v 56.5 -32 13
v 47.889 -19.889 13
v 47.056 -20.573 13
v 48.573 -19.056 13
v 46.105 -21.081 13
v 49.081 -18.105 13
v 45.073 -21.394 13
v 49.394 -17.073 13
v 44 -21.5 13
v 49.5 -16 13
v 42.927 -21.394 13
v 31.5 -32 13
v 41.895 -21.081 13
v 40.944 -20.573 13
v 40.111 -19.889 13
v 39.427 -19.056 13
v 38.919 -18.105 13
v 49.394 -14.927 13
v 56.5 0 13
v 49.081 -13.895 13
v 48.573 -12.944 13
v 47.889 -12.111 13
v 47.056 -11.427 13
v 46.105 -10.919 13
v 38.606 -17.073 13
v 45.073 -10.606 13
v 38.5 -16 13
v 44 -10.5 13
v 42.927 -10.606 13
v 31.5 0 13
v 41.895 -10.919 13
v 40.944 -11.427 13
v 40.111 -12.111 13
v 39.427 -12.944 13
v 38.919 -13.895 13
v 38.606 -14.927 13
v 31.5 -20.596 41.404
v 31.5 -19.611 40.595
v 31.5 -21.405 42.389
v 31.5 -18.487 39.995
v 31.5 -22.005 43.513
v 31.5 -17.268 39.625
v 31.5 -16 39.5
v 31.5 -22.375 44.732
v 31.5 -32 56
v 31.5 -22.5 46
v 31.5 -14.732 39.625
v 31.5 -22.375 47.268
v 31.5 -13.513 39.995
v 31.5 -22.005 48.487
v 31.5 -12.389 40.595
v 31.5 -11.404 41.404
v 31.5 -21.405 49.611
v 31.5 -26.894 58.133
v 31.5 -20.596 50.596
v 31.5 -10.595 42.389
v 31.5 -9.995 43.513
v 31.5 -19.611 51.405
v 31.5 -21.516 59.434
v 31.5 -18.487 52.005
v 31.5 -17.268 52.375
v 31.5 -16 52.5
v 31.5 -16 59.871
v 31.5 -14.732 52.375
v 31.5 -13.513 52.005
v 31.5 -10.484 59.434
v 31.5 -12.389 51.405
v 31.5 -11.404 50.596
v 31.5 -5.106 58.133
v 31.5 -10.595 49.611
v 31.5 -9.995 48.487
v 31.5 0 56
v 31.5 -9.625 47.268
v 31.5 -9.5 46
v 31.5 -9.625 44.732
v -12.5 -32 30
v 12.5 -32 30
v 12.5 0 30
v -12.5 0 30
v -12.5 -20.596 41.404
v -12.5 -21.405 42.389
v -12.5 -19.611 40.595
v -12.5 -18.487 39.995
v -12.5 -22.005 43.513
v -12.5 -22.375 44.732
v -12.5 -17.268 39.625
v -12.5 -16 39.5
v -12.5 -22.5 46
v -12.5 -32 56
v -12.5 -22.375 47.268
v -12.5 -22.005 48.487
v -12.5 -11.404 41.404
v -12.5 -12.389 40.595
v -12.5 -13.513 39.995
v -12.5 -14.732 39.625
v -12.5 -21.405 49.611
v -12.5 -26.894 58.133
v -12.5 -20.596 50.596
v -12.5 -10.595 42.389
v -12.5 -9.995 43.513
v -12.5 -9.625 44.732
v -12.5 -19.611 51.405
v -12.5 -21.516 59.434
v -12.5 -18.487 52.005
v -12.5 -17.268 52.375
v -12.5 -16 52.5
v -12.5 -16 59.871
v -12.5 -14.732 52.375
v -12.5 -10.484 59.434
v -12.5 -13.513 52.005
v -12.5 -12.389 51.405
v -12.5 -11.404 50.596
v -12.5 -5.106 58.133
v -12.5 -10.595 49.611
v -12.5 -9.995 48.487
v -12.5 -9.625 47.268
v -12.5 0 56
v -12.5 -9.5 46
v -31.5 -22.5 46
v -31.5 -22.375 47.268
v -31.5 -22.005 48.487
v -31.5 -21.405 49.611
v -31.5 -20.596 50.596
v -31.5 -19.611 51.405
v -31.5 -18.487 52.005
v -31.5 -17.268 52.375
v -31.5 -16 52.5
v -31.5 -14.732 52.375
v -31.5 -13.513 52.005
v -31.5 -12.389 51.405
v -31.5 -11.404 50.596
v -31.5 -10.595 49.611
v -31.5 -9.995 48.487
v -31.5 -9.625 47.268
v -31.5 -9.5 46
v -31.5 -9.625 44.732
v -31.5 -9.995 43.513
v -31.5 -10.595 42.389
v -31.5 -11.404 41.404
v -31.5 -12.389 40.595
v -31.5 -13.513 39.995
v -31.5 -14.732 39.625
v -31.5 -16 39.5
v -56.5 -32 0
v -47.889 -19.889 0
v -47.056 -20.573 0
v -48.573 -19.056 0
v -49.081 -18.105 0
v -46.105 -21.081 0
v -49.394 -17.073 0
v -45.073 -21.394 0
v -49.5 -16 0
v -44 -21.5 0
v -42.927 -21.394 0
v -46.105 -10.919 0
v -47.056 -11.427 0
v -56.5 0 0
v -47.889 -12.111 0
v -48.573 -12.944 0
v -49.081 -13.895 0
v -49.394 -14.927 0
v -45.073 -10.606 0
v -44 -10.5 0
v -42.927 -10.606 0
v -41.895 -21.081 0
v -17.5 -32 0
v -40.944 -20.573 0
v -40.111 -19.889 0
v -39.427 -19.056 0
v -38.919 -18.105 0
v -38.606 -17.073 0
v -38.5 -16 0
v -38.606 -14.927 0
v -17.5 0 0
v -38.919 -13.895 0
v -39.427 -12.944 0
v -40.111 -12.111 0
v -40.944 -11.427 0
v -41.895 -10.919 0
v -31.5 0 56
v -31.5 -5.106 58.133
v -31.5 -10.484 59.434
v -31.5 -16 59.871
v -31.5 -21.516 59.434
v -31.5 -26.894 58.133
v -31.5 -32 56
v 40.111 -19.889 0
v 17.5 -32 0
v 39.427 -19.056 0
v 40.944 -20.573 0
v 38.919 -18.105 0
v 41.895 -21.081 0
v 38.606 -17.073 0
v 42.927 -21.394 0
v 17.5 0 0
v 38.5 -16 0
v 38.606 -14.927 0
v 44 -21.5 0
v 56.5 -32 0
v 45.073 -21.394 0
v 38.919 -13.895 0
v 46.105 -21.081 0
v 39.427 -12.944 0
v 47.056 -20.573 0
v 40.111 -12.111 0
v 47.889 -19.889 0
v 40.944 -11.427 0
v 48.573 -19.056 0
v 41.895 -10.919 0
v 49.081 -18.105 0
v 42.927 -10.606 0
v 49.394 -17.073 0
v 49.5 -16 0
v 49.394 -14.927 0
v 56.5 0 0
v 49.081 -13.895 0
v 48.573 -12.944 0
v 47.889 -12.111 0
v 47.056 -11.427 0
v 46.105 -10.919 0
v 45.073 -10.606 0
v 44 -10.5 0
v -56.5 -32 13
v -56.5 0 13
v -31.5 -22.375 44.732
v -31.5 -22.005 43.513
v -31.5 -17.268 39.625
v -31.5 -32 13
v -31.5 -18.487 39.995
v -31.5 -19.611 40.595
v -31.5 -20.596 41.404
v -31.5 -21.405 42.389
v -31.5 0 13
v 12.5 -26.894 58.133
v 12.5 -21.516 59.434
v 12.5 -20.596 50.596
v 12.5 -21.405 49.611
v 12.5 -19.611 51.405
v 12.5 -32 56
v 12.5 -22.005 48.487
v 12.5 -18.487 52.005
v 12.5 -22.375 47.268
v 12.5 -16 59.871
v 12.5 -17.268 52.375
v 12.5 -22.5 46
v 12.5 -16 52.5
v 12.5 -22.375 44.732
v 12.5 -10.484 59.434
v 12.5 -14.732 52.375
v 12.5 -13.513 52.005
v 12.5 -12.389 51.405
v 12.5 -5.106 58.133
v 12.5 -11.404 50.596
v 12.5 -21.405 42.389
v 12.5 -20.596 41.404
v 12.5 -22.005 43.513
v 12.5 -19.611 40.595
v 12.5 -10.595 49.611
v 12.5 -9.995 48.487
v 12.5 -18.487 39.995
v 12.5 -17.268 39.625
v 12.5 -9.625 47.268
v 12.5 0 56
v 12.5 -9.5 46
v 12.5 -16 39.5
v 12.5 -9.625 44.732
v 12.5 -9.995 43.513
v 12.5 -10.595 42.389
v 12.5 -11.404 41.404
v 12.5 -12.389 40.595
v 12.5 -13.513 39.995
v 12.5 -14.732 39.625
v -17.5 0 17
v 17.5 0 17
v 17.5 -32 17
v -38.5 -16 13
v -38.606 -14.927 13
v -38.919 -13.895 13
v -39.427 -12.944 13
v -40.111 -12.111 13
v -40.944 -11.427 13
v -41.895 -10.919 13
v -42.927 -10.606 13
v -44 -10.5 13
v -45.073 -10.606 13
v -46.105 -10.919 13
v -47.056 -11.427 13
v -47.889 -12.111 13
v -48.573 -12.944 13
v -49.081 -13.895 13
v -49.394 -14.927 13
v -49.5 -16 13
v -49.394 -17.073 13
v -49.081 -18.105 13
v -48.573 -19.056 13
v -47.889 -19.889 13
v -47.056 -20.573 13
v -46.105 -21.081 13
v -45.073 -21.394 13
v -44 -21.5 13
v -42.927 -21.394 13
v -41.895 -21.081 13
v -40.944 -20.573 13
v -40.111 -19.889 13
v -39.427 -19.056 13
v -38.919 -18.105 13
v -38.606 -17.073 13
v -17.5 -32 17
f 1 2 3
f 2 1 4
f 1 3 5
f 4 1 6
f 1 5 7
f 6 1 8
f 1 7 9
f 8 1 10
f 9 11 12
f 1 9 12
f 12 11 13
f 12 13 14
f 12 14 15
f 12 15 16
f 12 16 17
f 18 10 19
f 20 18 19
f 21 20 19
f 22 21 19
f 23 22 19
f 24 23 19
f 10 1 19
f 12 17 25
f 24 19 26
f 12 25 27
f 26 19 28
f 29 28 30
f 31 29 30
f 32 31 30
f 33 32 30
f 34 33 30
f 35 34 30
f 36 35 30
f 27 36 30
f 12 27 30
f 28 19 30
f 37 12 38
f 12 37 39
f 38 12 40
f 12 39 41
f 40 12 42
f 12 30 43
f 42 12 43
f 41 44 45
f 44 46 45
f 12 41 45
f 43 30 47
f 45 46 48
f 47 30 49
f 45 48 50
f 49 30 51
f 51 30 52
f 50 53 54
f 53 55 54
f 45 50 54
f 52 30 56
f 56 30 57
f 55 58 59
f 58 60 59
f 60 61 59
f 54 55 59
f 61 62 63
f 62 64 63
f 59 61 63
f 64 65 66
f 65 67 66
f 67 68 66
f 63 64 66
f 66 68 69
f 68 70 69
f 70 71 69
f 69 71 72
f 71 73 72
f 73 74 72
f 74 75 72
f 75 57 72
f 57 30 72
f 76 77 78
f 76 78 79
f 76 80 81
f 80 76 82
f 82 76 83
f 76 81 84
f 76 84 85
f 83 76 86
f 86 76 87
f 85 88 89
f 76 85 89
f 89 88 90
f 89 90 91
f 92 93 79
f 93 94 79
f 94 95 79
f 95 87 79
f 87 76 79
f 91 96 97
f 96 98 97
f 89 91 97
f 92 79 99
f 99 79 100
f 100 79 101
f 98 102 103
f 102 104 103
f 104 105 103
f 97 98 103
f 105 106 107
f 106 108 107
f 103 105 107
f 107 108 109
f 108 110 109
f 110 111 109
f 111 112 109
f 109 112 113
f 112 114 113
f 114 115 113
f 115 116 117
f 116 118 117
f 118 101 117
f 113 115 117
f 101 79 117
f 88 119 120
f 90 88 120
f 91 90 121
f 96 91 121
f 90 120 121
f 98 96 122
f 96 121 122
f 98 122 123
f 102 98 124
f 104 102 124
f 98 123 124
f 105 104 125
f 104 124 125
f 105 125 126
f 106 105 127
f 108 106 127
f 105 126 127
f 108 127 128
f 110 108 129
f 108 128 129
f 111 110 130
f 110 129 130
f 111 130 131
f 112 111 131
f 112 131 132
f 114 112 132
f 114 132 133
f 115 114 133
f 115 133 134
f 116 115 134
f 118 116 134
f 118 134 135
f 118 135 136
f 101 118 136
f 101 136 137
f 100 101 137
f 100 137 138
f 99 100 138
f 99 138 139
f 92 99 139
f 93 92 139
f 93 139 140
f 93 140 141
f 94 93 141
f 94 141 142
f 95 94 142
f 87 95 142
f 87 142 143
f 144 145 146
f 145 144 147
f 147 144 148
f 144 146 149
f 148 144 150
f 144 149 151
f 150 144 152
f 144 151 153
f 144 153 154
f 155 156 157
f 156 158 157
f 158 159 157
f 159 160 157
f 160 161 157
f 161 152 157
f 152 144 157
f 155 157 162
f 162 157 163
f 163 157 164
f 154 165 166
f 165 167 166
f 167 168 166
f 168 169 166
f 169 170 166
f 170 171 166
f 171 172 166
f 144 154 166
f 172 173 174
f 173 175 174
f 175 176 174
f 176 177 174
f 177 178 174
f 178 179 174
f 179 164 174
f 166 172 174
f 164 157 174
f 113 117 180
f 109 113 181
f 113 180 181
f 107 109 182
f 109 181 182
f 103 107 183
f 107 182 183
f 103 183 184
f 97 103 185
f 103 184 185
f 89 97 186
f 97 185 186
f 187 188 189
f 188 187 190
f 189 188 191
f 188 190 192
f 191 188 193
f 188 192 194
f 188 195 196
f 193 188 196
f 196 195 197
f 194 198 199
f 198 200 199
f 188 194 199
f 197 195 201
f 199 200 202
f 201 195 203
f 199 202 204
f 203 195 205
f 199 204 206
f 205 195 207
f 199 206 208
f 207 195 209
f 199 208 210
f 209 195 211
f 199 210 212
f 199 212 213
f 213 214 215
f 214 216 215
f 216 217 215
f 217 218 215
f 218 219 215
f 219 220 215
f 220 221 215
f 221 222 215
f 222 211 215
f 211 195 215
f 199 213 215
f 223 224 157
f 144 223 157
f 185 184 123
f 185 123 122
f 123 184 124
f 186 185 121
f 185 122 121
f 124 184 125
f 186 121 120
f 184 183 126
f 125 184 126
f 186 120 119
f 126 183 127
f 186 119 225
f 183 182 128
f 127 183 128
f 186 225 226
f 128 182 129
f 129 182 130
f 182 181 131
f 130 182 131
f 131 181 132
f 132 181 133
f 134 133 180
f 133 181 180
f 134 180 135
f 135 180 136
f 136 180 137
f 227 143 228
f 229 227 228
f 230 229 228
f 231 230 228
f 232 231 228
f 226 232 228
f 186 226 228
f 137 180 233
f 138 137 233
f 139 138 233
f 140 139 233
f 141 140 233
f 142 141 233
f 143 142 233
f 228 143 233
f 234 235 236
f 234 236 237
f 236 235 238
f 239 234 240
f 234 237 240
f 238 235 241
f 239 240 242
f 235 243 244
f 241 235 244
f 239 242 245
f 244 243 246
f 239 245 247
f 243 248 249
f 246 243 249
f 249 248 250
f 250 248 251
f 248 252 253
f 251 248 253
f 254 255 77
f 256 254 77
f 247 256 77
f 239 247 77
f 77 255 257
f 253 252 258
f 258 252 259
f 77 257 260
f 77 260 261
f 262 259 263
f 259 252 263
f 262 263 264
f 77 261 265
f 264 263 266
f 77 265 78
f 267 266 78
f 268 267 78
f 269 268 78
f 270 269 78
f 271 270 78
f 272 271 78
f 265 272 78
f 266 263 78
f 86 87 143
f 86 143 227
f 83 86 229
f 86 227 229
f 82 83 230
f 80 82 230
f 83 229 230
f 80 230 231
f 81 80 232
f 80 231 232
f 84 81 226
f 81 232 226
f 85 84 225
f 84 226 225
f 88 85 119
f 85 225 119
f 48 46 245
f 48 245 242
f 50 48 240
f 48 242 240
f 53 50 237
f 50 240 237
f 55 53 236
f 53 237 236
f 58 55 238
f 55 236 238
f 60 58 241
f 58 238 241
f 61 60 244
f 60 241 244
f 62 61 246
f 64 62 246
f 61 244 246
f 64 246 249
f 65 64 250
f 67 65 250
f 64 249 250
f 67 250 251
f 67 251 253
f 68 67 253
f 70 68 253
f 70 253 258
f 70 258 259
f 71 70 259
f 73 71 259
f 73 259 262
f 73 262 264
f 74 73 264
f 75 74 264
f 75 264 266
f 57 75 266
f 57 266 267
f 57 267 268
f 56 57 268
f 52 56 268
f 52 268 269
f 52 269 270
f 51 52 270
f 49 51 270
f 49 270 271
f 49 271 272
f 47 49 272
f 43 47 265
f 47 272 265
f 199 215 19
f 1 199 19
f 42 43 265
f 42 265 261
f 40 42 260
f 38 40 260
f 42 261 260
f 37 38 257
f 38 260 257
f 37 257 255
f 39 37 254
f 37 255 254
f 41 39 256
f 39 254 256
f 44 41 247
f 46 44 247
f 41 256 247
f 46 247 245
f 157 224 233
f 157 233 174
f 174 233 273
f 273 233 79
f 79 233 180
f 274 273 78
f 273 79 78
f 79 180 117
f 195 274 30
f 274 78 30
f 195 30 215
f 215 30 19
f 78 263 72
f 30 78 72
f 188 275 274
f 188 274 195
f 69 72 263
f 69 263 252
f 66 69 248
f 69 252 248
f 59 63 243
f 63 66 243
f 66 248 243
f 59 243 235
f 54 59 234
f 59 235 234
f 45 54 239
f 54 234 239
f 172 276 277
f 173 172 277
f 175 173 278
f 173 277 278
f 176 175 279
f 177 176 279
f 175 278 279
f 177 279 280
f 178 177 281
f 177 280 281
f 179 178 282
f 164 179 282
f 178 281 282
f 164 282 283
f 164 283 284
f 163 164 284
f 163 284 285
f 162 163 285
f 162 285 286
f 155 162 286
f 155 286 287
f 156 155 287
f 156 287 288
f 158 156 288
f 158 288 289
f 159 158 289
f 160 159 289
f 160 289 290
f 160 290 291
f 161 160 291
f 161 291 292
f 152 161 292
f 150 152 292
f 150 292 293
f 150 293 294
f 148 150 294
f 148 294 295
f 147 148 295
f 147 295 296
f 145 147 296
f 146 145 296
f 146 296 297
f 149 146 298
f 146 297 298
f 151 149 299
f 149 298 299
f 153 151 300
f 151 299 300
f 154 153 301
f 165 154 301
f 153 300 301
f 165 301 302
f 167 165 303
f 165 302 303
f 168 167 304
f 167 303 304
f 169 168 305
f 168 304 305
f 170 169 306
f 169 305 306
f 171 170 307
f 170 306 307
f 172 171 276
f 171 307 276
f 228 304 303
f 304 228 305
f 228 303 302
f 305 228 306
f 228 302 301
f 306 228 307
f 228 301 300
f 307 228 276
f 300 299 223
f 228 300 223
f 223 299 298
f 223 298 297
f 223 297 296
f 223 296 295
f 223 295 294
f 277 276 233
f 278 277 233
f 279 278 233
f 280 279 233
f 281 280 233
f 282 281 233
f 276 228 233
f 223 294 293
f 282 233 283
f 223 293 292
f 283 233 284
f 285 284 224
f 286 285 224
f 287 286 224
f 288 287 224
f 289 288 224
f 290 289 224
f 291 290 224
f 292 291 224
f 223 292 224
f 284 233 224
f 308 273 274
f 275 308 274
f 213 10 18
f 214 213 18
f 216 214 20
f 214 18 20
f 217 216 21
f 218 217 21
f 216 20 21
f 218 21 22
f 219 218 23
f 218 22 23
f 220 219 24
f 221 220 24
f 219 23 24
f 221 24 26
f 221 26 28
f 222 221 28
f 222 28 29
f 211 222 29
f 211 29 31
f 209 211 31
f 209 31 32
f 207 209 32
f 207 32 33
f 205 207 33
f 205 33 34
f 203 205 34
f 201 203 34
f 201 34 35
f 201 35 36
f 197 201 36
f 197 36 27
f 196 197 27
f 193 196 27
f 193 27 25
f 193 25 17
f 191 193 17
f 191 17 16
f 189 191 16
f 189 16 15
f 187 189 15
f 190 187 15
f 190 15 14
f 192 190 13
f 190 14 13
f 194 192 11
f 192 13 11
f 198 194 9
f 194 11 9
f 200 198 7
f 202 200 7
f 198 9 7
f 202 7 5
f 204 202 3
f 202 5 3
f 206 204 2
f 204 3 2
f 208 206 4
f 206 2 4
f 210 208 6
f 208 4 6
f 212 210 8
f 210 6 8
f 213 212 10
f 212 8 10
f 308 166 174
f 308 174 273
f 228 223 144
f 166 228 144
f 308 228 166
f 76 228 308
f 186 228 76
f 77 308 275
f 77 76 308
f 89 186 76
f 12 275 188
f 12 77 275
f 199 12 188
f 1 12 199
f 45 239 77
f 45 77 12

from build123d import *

# Parameters (mm, degrees)
F1_DEPTH = 32
F2_R     = 5.5
F4_DEPTH = 13.001
F3_R     = 5.5
F5_DEPTH = 13.001
F7_DEPTH = 88.001
F9_DEPTH = 88.001


with BuildPart() as f1:
    # F0 (on Front) → F1 (new body)
    with BuildSketch(Plane.XZ):
        Polygon((17.5, 0), (56.5, 0), (56.5, 13), (31.5, 13), (31.5, 64), (12.5, 64), (12.5, 30), (-12.5, 30), (-12.5, 64), (-31.5, 64), (-31.5, 13), (-56.5, 13), (-56.5, 0), (-17.5, 0), (-17.5, 17), (17.5, 17), align=None)
    extrude(amount=F1_DEPTH)

    # F2 (on face) → F4 (cut, through all)
    with BuildSketch(Plane.XY.offset(13)):
        with Locations((-44, -16)):
            Circle(F2_R)
    extrude(amount=-F4_DEPTH, mode=Mode.SUBTRACT)

    # F3 (on face) → F5 (cut, through all)
    with BuildSketch(Plane.XY.offset(13)):
        with Locations((44, -16)):
            Circle(F3_R)
    extrude(amount=-F5_DEPTH, mode=Mode.SUBTRACT)

    # F6 (on face) → F7 (cut, through all)
    with BuildSketch(Plane(origin=(-31.5, 0, 0), x_dir=(0, -1, 0), z_dir=(-1, 0, 0))):
        with BuildLine():
            ThreePointArc((22.5, 46), (11.403806, 50.596194), (16, 39.5))
            ThreePointArc((16, 39.5), (20.596194, 41.403806), (22.5, 46))
        make_face()
    extrude(amount=-F7_DEPTH, mode=Mode.SUBTRACT)

    # F8 (on face) → F9 (cut, through all)
    with BuildSketch(Plane(origin=(-31.5, 0, 0), x_dir=(0, -1, 0), z_dir=(-1, 0, 0))):
        with BuildLine():
            ThreePointArc((0, 56), (16, 59.871235), (32, 56))
            Line((32, 56), (32, 64))
            Line((32, 64), (0, 64))
            Line((0, 64), (0, 56))
        make_face()
    extrude(amount=-F9_DEPTH, mode=Mode.SUBTRACT)


solid = f1.part
